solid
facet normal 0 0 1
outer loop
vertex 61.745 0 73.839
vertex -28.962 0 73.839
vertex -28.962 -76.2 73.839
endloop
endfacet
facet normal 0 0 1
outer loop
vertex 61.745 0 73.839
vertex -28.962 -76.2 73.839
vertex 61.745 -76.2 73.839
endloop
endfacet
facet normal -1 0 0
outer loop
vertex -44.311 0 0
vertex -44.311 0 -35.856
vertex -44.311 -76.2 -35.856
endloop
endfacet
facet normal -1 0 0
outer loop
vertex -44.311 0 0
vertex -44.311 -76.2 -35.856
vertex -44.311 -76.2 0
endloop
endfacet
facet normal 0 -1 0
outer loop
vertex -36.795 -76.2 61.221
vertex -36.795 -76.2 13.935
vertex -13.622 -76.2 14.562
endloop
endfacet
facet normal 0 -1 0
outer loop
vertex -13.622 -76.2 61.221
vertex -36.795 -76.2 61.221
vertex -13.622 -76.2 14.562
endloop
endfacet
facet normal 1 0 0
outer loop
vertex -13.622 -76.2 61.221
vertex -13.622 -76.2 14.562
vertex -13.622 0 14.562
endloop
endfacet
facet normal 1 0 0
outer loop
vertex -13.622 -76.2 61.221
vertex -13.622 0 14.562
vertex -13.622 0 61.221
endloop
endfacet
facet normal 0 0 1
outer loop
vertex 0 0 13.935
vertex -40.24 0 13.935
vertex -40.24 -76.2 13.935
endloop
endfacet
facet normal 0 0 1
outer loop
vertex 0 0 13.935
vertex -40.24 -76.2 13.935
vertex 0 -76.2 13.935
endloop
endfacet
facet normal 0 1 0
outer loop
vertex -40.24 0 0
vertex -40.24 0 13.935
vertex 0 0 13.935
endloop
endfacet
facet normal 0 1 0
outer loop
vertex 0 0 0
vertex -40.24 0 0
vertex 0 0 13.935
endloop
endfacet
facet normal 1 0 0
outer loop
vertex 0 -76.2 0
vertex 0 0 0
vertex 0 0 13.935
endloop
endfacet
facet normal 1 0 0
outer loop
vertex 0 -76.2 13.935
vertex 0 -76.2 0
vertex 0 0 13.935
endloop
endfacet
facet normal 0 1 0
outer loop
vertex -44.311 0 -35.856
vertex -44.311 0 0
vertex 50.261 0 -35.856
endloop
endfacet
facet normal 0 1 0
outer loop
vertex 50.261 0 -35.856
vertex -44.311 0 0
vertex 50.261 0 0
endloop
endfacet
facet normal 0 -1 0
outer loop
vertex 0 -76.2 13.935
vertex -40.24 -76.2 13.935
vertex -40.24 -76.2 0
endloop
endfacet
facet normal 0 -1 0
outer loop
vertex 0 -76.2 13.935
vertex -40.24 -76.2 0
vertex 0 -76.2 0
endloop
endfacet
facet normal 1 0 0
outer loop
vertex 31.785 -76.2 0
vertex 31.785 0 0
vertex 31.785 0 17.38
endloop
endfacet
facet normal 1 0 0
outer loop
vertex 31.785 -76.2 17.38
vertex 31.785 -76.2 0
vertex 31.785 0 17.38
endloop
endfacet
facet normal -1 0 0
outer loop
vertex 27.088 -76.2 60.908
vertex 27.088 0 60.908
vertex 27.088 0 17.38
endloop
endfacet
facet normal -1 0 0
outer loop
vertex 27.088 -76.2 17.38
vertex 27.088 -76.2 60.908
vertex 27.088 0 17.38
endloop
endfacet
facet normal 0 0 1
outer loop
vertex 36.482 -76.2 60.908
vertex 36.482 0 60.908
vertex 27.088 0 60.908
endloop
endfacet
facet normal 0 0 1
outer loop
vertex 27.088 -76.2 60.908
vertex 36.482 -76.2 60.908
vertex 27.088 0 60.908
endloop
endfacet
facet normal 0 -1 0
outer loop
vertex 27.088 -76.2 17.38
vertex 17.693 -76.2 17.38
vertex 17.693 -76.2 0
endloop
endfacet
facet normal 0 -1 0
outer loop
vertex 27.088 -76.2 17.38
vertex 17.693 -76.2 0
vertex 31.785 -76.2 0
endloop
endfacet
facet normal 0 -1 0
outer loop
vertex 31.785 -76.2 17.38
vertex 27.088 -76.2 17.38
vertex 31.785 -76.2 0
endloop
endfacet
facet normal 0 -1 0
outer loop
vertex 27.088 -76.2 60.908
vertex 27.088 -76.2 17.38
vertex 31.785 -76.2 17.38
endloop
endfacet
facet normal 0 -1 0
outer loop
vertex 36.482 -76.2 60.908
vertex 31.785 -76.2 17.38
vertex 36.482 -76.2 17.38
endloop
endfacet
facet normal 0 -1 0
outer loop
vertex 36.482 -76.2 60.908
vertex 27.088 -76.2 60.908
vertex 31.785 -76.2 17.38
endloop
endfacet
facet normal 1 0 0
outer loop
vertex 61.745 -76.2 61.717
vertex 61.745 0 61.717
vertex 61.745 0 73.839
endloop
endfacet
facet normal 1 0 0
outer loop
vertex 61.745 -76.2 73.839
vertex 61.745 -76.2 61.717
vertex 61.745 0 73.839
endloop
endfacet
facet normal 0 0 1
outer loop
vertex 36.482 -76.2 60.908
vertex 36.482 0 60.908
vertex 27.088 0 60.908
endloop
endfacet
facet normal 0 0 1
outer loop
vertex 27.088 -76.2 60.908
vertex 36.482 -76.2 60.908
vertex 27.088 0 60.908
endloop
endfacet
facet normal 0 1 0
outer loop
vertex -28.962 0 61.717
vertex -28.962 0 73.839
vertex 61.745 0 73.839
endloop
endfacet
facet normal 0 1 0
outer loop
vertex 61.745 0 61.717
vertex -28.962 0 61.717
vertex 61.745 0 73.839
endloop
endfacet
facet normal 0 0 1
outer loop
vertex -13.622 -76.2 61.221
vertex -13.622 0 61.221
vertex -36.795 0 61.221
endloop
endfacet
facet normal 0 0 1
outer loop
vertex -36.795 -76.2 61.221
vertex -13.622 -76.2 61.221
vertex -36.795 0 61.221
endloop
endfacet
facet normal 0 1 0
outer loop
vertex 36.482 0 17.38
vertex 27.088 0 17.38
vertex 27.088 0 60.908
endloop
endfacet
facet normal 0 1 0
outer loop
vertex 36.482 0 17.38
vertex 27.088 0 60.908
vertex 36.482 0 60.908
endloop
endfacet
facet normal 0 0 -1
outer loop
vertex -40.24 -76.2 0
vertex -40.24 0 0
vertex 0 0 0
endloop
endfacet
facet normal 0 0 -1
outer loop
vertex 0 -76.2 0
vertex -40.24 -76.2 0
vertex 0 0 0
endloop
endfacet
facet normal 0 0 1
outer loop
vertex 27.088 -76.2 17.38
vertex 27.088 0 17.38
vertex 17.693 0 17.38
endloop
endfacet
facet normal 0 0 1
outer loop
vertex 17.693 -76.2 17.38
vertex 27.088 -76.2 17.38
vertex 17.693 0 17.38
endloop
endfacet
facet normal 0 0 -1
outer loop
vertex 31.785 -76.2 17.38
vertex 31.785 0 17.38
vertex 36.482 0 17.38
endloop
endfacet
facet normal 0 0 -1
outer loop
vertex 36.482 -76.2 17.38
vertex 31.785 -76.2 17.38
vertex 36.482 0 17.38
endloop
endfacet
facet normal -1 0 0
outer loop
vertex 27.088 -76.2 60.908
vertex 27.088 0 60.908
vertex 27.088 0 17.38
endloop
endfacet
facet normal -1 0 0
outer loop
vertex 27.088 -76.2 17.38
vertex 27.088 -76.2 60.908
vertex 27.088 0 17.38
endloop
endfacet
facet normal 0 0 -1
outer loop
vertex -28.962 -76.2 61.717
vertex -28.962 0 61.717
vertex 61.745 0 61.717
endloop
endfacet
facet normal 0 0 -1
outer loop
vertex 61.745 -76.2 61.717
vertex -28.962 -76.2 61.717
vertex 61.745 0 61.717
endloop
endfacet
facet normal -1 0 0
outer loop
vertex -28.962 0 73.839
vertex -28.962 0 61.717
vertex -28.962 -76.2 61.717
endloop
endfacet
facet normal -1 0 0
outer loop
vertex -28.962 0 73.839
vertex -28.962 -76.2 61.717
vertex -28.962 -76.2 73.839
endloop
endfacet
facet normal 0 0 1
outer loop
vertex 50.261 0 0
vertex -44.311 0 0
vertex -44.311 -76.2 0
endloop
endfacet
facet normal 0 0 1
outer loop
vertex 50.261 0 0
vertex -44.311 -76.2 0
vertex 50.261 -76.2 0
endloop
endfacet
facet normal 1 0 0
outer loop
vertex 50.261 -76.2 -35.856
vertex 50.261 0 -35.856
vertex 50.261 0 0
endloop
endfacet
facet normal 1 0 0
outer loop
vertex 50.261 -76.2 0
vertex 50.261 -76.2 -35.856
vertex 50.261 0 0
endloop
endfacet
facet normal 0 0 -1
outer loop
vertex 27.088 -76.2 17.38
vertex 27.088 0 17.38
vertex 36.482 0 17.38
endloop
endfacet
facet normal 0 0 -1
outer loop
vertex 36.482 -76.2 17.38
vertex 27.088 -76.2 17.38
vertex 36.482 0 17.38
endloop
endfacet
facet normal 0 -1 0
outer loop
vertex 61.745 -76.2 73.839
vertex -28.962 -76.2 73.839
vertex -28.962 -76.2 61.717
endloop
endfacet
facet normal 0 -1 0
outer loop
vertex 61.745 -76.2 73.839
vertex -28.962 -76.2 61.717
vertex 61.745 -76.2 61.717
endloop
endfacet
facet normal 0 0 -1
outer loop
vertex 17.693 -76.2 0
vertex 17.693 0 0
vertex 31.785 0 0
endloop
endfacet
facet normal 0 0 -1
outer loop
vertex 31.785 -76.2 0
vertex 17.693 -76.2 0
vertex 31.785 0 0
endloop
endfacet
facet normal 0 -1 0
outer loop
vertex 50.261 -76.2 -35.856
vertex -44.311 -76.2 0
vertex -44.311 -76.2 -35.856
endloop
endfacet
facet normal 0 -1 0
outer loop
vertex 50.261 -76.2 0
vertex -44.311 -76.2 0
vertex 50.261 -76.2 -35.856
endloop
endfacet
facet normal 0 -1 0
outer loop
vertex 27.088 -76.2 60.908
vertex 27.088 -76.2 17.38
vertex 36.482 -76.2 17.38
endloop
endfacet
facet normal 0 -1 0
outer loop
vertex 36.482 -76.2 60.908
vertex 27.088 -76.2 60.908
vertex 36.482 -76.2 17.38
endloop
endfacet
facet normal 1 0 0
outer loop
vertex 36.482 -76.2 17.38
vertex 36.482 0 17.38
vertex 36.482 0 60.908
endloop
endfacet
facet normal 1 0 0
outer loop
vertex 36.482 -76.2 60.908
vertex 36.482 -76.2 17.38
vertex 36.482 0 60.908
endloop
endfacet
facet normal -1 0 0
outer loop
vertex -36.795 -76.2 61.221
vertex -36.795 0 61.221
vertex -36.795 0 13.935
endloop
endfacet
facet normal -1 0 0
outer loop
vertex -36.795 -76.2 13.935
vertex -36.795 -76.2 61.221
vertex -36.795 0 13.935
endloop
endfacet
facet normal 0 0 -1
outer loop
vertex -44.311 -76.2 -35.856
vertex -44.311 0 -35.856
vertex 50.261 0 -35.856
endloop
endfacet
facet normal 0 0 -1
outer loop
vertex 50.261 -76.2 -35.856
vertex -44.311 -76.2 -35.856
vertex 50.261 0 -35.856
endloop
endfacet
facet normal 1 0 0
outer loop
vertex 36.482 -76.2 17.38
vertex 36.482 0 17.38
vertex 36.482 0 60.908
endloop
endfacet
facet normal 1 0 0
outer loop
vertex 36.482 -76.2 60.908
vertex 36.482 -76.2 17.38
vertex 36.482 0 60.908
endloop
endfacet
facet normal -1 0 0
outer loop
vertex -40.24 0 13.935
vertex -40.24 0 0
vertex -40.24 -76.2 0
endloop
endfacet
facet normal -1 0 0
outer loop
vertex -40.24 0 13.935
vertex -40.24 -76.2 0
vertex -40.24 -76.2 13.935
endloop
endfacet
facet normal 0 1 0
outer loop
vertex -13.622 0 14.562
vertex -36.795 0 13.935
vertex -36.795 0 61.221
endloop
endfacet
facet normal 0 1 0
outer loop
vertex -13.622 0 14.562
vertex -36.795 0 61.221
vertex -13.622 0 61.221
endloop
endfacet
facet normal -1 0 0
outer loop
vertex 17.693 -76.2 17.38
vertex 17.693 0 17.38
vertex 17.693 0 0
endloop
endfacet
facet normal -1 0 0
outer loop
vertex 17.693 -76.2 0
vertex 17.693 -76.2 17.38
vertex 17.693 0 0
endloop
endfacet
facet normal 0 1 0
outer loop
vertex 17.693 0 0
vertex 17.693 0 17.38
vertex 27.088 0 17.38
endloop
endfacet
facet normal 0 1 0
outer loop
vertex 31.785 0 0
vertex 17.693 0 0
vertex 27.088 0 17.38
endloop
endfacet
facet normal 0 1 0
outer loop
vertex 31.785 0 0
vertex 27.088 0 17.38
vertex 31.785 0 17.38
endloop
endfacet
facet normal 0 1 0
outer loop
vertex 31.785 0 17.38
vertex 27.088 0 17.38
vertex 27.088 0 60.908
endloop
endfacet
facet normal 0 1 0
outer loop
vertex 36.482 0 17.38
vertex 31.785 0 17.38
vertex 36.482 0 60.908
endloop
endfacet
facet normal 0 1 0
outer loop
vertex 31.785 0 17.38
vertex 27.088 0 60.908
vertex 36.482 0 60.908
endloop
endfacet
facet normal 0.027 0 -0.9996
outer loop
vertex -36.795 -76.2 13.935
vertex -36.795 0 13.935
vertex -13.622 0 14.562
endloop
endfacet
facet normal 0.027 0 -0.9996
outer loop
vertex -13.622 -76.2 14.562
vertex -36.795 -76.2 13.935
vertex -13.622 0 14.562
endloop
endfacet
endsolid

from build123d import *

# Parameters (mm, degrees)
F0_W      = 94.571505
F0_H      = 35.855751
F1_DEPTH  = 76.2
F2_W      = 40.239863
F2_H      = 13.935206
F3_DEPTH  = 76.2
F5_DEPTH  = 76.2
F6_W      = 90.707308
F6_H      = 12.12218
F7_DEPTH  = 76.2
F9_DEPTH  = 76.2
F10_DEPTH = 76.2


with BuildPart() as f1:
    # F0 (on Front) → F1 (new body)
    with BuildSketch(Plane.XZ):
        with Locations((2.974929, -17.927875)):
            Rectangle(F0_W, F0_H)
    extrude(amount=F1_DEPTH)


with BuildPart() as f3:
    # F2 (on Front) → F3 (new body)
    with BuildSketch(Plane.XZ):
        with Locations((-20.119931, 6.967603)):
            Rectangle(F2_W, F2_H)
    extrude(amount=F3_DEPTH)


with BuildPart() as f5:
    # F4 (on Front) → F5 (new body)
    with BuildSketch(Plane.XZ):
        Polygon((-36.795206, 61.220959), (-36.795206, 13.935206), (-13.622055, 14.561508), (-13.622055, 61.220959), align=None)
    extrude(amount=F5_DEPTH)


with BuildPart() as f7:
    # F6 (on Front) → F7 (new body)
    with BuildSketch(Plane.XZ):
        with Locations((16.391584, 67.777896)):
            Rectangle(F6_W, F6_H)
    extrude(amount=F7_DEPTH)


with BuildPart() as f9:
    # F8 (on Front) → F9 (new body)
    with BuildSketch(Plane.XZ):
        Polygon((36.482055, 60.907811), (27.087534, 60.907811), (27.087534, 17.379863), (31.784794, 17.379863), (36.482055, 17.379863), align=None)
    extrude(amount=F9_DEPTH)


with BuildPart() as f10:
    # F8 (on Front) → F10 (new body)
    with BuildSketch(Plane.XZ):
        Polygon((36.482055, 60.907811), (27.087534, 60.907811), (27.087534, 17.379863), (31.784794, 17.379863), (36.482055, 17.379863), align=None)
        Polygon((31.784794, 17.379863), (27.087534, 17.379863), (17.693011, 17.379863), (17.693011, 0), (31.784794, 0), align=None)
    extrude(amount=F10_DEPTH)


solid = Compound([f1.part, f3.part, f5.part, f7.part, f9.part, f10.part])
